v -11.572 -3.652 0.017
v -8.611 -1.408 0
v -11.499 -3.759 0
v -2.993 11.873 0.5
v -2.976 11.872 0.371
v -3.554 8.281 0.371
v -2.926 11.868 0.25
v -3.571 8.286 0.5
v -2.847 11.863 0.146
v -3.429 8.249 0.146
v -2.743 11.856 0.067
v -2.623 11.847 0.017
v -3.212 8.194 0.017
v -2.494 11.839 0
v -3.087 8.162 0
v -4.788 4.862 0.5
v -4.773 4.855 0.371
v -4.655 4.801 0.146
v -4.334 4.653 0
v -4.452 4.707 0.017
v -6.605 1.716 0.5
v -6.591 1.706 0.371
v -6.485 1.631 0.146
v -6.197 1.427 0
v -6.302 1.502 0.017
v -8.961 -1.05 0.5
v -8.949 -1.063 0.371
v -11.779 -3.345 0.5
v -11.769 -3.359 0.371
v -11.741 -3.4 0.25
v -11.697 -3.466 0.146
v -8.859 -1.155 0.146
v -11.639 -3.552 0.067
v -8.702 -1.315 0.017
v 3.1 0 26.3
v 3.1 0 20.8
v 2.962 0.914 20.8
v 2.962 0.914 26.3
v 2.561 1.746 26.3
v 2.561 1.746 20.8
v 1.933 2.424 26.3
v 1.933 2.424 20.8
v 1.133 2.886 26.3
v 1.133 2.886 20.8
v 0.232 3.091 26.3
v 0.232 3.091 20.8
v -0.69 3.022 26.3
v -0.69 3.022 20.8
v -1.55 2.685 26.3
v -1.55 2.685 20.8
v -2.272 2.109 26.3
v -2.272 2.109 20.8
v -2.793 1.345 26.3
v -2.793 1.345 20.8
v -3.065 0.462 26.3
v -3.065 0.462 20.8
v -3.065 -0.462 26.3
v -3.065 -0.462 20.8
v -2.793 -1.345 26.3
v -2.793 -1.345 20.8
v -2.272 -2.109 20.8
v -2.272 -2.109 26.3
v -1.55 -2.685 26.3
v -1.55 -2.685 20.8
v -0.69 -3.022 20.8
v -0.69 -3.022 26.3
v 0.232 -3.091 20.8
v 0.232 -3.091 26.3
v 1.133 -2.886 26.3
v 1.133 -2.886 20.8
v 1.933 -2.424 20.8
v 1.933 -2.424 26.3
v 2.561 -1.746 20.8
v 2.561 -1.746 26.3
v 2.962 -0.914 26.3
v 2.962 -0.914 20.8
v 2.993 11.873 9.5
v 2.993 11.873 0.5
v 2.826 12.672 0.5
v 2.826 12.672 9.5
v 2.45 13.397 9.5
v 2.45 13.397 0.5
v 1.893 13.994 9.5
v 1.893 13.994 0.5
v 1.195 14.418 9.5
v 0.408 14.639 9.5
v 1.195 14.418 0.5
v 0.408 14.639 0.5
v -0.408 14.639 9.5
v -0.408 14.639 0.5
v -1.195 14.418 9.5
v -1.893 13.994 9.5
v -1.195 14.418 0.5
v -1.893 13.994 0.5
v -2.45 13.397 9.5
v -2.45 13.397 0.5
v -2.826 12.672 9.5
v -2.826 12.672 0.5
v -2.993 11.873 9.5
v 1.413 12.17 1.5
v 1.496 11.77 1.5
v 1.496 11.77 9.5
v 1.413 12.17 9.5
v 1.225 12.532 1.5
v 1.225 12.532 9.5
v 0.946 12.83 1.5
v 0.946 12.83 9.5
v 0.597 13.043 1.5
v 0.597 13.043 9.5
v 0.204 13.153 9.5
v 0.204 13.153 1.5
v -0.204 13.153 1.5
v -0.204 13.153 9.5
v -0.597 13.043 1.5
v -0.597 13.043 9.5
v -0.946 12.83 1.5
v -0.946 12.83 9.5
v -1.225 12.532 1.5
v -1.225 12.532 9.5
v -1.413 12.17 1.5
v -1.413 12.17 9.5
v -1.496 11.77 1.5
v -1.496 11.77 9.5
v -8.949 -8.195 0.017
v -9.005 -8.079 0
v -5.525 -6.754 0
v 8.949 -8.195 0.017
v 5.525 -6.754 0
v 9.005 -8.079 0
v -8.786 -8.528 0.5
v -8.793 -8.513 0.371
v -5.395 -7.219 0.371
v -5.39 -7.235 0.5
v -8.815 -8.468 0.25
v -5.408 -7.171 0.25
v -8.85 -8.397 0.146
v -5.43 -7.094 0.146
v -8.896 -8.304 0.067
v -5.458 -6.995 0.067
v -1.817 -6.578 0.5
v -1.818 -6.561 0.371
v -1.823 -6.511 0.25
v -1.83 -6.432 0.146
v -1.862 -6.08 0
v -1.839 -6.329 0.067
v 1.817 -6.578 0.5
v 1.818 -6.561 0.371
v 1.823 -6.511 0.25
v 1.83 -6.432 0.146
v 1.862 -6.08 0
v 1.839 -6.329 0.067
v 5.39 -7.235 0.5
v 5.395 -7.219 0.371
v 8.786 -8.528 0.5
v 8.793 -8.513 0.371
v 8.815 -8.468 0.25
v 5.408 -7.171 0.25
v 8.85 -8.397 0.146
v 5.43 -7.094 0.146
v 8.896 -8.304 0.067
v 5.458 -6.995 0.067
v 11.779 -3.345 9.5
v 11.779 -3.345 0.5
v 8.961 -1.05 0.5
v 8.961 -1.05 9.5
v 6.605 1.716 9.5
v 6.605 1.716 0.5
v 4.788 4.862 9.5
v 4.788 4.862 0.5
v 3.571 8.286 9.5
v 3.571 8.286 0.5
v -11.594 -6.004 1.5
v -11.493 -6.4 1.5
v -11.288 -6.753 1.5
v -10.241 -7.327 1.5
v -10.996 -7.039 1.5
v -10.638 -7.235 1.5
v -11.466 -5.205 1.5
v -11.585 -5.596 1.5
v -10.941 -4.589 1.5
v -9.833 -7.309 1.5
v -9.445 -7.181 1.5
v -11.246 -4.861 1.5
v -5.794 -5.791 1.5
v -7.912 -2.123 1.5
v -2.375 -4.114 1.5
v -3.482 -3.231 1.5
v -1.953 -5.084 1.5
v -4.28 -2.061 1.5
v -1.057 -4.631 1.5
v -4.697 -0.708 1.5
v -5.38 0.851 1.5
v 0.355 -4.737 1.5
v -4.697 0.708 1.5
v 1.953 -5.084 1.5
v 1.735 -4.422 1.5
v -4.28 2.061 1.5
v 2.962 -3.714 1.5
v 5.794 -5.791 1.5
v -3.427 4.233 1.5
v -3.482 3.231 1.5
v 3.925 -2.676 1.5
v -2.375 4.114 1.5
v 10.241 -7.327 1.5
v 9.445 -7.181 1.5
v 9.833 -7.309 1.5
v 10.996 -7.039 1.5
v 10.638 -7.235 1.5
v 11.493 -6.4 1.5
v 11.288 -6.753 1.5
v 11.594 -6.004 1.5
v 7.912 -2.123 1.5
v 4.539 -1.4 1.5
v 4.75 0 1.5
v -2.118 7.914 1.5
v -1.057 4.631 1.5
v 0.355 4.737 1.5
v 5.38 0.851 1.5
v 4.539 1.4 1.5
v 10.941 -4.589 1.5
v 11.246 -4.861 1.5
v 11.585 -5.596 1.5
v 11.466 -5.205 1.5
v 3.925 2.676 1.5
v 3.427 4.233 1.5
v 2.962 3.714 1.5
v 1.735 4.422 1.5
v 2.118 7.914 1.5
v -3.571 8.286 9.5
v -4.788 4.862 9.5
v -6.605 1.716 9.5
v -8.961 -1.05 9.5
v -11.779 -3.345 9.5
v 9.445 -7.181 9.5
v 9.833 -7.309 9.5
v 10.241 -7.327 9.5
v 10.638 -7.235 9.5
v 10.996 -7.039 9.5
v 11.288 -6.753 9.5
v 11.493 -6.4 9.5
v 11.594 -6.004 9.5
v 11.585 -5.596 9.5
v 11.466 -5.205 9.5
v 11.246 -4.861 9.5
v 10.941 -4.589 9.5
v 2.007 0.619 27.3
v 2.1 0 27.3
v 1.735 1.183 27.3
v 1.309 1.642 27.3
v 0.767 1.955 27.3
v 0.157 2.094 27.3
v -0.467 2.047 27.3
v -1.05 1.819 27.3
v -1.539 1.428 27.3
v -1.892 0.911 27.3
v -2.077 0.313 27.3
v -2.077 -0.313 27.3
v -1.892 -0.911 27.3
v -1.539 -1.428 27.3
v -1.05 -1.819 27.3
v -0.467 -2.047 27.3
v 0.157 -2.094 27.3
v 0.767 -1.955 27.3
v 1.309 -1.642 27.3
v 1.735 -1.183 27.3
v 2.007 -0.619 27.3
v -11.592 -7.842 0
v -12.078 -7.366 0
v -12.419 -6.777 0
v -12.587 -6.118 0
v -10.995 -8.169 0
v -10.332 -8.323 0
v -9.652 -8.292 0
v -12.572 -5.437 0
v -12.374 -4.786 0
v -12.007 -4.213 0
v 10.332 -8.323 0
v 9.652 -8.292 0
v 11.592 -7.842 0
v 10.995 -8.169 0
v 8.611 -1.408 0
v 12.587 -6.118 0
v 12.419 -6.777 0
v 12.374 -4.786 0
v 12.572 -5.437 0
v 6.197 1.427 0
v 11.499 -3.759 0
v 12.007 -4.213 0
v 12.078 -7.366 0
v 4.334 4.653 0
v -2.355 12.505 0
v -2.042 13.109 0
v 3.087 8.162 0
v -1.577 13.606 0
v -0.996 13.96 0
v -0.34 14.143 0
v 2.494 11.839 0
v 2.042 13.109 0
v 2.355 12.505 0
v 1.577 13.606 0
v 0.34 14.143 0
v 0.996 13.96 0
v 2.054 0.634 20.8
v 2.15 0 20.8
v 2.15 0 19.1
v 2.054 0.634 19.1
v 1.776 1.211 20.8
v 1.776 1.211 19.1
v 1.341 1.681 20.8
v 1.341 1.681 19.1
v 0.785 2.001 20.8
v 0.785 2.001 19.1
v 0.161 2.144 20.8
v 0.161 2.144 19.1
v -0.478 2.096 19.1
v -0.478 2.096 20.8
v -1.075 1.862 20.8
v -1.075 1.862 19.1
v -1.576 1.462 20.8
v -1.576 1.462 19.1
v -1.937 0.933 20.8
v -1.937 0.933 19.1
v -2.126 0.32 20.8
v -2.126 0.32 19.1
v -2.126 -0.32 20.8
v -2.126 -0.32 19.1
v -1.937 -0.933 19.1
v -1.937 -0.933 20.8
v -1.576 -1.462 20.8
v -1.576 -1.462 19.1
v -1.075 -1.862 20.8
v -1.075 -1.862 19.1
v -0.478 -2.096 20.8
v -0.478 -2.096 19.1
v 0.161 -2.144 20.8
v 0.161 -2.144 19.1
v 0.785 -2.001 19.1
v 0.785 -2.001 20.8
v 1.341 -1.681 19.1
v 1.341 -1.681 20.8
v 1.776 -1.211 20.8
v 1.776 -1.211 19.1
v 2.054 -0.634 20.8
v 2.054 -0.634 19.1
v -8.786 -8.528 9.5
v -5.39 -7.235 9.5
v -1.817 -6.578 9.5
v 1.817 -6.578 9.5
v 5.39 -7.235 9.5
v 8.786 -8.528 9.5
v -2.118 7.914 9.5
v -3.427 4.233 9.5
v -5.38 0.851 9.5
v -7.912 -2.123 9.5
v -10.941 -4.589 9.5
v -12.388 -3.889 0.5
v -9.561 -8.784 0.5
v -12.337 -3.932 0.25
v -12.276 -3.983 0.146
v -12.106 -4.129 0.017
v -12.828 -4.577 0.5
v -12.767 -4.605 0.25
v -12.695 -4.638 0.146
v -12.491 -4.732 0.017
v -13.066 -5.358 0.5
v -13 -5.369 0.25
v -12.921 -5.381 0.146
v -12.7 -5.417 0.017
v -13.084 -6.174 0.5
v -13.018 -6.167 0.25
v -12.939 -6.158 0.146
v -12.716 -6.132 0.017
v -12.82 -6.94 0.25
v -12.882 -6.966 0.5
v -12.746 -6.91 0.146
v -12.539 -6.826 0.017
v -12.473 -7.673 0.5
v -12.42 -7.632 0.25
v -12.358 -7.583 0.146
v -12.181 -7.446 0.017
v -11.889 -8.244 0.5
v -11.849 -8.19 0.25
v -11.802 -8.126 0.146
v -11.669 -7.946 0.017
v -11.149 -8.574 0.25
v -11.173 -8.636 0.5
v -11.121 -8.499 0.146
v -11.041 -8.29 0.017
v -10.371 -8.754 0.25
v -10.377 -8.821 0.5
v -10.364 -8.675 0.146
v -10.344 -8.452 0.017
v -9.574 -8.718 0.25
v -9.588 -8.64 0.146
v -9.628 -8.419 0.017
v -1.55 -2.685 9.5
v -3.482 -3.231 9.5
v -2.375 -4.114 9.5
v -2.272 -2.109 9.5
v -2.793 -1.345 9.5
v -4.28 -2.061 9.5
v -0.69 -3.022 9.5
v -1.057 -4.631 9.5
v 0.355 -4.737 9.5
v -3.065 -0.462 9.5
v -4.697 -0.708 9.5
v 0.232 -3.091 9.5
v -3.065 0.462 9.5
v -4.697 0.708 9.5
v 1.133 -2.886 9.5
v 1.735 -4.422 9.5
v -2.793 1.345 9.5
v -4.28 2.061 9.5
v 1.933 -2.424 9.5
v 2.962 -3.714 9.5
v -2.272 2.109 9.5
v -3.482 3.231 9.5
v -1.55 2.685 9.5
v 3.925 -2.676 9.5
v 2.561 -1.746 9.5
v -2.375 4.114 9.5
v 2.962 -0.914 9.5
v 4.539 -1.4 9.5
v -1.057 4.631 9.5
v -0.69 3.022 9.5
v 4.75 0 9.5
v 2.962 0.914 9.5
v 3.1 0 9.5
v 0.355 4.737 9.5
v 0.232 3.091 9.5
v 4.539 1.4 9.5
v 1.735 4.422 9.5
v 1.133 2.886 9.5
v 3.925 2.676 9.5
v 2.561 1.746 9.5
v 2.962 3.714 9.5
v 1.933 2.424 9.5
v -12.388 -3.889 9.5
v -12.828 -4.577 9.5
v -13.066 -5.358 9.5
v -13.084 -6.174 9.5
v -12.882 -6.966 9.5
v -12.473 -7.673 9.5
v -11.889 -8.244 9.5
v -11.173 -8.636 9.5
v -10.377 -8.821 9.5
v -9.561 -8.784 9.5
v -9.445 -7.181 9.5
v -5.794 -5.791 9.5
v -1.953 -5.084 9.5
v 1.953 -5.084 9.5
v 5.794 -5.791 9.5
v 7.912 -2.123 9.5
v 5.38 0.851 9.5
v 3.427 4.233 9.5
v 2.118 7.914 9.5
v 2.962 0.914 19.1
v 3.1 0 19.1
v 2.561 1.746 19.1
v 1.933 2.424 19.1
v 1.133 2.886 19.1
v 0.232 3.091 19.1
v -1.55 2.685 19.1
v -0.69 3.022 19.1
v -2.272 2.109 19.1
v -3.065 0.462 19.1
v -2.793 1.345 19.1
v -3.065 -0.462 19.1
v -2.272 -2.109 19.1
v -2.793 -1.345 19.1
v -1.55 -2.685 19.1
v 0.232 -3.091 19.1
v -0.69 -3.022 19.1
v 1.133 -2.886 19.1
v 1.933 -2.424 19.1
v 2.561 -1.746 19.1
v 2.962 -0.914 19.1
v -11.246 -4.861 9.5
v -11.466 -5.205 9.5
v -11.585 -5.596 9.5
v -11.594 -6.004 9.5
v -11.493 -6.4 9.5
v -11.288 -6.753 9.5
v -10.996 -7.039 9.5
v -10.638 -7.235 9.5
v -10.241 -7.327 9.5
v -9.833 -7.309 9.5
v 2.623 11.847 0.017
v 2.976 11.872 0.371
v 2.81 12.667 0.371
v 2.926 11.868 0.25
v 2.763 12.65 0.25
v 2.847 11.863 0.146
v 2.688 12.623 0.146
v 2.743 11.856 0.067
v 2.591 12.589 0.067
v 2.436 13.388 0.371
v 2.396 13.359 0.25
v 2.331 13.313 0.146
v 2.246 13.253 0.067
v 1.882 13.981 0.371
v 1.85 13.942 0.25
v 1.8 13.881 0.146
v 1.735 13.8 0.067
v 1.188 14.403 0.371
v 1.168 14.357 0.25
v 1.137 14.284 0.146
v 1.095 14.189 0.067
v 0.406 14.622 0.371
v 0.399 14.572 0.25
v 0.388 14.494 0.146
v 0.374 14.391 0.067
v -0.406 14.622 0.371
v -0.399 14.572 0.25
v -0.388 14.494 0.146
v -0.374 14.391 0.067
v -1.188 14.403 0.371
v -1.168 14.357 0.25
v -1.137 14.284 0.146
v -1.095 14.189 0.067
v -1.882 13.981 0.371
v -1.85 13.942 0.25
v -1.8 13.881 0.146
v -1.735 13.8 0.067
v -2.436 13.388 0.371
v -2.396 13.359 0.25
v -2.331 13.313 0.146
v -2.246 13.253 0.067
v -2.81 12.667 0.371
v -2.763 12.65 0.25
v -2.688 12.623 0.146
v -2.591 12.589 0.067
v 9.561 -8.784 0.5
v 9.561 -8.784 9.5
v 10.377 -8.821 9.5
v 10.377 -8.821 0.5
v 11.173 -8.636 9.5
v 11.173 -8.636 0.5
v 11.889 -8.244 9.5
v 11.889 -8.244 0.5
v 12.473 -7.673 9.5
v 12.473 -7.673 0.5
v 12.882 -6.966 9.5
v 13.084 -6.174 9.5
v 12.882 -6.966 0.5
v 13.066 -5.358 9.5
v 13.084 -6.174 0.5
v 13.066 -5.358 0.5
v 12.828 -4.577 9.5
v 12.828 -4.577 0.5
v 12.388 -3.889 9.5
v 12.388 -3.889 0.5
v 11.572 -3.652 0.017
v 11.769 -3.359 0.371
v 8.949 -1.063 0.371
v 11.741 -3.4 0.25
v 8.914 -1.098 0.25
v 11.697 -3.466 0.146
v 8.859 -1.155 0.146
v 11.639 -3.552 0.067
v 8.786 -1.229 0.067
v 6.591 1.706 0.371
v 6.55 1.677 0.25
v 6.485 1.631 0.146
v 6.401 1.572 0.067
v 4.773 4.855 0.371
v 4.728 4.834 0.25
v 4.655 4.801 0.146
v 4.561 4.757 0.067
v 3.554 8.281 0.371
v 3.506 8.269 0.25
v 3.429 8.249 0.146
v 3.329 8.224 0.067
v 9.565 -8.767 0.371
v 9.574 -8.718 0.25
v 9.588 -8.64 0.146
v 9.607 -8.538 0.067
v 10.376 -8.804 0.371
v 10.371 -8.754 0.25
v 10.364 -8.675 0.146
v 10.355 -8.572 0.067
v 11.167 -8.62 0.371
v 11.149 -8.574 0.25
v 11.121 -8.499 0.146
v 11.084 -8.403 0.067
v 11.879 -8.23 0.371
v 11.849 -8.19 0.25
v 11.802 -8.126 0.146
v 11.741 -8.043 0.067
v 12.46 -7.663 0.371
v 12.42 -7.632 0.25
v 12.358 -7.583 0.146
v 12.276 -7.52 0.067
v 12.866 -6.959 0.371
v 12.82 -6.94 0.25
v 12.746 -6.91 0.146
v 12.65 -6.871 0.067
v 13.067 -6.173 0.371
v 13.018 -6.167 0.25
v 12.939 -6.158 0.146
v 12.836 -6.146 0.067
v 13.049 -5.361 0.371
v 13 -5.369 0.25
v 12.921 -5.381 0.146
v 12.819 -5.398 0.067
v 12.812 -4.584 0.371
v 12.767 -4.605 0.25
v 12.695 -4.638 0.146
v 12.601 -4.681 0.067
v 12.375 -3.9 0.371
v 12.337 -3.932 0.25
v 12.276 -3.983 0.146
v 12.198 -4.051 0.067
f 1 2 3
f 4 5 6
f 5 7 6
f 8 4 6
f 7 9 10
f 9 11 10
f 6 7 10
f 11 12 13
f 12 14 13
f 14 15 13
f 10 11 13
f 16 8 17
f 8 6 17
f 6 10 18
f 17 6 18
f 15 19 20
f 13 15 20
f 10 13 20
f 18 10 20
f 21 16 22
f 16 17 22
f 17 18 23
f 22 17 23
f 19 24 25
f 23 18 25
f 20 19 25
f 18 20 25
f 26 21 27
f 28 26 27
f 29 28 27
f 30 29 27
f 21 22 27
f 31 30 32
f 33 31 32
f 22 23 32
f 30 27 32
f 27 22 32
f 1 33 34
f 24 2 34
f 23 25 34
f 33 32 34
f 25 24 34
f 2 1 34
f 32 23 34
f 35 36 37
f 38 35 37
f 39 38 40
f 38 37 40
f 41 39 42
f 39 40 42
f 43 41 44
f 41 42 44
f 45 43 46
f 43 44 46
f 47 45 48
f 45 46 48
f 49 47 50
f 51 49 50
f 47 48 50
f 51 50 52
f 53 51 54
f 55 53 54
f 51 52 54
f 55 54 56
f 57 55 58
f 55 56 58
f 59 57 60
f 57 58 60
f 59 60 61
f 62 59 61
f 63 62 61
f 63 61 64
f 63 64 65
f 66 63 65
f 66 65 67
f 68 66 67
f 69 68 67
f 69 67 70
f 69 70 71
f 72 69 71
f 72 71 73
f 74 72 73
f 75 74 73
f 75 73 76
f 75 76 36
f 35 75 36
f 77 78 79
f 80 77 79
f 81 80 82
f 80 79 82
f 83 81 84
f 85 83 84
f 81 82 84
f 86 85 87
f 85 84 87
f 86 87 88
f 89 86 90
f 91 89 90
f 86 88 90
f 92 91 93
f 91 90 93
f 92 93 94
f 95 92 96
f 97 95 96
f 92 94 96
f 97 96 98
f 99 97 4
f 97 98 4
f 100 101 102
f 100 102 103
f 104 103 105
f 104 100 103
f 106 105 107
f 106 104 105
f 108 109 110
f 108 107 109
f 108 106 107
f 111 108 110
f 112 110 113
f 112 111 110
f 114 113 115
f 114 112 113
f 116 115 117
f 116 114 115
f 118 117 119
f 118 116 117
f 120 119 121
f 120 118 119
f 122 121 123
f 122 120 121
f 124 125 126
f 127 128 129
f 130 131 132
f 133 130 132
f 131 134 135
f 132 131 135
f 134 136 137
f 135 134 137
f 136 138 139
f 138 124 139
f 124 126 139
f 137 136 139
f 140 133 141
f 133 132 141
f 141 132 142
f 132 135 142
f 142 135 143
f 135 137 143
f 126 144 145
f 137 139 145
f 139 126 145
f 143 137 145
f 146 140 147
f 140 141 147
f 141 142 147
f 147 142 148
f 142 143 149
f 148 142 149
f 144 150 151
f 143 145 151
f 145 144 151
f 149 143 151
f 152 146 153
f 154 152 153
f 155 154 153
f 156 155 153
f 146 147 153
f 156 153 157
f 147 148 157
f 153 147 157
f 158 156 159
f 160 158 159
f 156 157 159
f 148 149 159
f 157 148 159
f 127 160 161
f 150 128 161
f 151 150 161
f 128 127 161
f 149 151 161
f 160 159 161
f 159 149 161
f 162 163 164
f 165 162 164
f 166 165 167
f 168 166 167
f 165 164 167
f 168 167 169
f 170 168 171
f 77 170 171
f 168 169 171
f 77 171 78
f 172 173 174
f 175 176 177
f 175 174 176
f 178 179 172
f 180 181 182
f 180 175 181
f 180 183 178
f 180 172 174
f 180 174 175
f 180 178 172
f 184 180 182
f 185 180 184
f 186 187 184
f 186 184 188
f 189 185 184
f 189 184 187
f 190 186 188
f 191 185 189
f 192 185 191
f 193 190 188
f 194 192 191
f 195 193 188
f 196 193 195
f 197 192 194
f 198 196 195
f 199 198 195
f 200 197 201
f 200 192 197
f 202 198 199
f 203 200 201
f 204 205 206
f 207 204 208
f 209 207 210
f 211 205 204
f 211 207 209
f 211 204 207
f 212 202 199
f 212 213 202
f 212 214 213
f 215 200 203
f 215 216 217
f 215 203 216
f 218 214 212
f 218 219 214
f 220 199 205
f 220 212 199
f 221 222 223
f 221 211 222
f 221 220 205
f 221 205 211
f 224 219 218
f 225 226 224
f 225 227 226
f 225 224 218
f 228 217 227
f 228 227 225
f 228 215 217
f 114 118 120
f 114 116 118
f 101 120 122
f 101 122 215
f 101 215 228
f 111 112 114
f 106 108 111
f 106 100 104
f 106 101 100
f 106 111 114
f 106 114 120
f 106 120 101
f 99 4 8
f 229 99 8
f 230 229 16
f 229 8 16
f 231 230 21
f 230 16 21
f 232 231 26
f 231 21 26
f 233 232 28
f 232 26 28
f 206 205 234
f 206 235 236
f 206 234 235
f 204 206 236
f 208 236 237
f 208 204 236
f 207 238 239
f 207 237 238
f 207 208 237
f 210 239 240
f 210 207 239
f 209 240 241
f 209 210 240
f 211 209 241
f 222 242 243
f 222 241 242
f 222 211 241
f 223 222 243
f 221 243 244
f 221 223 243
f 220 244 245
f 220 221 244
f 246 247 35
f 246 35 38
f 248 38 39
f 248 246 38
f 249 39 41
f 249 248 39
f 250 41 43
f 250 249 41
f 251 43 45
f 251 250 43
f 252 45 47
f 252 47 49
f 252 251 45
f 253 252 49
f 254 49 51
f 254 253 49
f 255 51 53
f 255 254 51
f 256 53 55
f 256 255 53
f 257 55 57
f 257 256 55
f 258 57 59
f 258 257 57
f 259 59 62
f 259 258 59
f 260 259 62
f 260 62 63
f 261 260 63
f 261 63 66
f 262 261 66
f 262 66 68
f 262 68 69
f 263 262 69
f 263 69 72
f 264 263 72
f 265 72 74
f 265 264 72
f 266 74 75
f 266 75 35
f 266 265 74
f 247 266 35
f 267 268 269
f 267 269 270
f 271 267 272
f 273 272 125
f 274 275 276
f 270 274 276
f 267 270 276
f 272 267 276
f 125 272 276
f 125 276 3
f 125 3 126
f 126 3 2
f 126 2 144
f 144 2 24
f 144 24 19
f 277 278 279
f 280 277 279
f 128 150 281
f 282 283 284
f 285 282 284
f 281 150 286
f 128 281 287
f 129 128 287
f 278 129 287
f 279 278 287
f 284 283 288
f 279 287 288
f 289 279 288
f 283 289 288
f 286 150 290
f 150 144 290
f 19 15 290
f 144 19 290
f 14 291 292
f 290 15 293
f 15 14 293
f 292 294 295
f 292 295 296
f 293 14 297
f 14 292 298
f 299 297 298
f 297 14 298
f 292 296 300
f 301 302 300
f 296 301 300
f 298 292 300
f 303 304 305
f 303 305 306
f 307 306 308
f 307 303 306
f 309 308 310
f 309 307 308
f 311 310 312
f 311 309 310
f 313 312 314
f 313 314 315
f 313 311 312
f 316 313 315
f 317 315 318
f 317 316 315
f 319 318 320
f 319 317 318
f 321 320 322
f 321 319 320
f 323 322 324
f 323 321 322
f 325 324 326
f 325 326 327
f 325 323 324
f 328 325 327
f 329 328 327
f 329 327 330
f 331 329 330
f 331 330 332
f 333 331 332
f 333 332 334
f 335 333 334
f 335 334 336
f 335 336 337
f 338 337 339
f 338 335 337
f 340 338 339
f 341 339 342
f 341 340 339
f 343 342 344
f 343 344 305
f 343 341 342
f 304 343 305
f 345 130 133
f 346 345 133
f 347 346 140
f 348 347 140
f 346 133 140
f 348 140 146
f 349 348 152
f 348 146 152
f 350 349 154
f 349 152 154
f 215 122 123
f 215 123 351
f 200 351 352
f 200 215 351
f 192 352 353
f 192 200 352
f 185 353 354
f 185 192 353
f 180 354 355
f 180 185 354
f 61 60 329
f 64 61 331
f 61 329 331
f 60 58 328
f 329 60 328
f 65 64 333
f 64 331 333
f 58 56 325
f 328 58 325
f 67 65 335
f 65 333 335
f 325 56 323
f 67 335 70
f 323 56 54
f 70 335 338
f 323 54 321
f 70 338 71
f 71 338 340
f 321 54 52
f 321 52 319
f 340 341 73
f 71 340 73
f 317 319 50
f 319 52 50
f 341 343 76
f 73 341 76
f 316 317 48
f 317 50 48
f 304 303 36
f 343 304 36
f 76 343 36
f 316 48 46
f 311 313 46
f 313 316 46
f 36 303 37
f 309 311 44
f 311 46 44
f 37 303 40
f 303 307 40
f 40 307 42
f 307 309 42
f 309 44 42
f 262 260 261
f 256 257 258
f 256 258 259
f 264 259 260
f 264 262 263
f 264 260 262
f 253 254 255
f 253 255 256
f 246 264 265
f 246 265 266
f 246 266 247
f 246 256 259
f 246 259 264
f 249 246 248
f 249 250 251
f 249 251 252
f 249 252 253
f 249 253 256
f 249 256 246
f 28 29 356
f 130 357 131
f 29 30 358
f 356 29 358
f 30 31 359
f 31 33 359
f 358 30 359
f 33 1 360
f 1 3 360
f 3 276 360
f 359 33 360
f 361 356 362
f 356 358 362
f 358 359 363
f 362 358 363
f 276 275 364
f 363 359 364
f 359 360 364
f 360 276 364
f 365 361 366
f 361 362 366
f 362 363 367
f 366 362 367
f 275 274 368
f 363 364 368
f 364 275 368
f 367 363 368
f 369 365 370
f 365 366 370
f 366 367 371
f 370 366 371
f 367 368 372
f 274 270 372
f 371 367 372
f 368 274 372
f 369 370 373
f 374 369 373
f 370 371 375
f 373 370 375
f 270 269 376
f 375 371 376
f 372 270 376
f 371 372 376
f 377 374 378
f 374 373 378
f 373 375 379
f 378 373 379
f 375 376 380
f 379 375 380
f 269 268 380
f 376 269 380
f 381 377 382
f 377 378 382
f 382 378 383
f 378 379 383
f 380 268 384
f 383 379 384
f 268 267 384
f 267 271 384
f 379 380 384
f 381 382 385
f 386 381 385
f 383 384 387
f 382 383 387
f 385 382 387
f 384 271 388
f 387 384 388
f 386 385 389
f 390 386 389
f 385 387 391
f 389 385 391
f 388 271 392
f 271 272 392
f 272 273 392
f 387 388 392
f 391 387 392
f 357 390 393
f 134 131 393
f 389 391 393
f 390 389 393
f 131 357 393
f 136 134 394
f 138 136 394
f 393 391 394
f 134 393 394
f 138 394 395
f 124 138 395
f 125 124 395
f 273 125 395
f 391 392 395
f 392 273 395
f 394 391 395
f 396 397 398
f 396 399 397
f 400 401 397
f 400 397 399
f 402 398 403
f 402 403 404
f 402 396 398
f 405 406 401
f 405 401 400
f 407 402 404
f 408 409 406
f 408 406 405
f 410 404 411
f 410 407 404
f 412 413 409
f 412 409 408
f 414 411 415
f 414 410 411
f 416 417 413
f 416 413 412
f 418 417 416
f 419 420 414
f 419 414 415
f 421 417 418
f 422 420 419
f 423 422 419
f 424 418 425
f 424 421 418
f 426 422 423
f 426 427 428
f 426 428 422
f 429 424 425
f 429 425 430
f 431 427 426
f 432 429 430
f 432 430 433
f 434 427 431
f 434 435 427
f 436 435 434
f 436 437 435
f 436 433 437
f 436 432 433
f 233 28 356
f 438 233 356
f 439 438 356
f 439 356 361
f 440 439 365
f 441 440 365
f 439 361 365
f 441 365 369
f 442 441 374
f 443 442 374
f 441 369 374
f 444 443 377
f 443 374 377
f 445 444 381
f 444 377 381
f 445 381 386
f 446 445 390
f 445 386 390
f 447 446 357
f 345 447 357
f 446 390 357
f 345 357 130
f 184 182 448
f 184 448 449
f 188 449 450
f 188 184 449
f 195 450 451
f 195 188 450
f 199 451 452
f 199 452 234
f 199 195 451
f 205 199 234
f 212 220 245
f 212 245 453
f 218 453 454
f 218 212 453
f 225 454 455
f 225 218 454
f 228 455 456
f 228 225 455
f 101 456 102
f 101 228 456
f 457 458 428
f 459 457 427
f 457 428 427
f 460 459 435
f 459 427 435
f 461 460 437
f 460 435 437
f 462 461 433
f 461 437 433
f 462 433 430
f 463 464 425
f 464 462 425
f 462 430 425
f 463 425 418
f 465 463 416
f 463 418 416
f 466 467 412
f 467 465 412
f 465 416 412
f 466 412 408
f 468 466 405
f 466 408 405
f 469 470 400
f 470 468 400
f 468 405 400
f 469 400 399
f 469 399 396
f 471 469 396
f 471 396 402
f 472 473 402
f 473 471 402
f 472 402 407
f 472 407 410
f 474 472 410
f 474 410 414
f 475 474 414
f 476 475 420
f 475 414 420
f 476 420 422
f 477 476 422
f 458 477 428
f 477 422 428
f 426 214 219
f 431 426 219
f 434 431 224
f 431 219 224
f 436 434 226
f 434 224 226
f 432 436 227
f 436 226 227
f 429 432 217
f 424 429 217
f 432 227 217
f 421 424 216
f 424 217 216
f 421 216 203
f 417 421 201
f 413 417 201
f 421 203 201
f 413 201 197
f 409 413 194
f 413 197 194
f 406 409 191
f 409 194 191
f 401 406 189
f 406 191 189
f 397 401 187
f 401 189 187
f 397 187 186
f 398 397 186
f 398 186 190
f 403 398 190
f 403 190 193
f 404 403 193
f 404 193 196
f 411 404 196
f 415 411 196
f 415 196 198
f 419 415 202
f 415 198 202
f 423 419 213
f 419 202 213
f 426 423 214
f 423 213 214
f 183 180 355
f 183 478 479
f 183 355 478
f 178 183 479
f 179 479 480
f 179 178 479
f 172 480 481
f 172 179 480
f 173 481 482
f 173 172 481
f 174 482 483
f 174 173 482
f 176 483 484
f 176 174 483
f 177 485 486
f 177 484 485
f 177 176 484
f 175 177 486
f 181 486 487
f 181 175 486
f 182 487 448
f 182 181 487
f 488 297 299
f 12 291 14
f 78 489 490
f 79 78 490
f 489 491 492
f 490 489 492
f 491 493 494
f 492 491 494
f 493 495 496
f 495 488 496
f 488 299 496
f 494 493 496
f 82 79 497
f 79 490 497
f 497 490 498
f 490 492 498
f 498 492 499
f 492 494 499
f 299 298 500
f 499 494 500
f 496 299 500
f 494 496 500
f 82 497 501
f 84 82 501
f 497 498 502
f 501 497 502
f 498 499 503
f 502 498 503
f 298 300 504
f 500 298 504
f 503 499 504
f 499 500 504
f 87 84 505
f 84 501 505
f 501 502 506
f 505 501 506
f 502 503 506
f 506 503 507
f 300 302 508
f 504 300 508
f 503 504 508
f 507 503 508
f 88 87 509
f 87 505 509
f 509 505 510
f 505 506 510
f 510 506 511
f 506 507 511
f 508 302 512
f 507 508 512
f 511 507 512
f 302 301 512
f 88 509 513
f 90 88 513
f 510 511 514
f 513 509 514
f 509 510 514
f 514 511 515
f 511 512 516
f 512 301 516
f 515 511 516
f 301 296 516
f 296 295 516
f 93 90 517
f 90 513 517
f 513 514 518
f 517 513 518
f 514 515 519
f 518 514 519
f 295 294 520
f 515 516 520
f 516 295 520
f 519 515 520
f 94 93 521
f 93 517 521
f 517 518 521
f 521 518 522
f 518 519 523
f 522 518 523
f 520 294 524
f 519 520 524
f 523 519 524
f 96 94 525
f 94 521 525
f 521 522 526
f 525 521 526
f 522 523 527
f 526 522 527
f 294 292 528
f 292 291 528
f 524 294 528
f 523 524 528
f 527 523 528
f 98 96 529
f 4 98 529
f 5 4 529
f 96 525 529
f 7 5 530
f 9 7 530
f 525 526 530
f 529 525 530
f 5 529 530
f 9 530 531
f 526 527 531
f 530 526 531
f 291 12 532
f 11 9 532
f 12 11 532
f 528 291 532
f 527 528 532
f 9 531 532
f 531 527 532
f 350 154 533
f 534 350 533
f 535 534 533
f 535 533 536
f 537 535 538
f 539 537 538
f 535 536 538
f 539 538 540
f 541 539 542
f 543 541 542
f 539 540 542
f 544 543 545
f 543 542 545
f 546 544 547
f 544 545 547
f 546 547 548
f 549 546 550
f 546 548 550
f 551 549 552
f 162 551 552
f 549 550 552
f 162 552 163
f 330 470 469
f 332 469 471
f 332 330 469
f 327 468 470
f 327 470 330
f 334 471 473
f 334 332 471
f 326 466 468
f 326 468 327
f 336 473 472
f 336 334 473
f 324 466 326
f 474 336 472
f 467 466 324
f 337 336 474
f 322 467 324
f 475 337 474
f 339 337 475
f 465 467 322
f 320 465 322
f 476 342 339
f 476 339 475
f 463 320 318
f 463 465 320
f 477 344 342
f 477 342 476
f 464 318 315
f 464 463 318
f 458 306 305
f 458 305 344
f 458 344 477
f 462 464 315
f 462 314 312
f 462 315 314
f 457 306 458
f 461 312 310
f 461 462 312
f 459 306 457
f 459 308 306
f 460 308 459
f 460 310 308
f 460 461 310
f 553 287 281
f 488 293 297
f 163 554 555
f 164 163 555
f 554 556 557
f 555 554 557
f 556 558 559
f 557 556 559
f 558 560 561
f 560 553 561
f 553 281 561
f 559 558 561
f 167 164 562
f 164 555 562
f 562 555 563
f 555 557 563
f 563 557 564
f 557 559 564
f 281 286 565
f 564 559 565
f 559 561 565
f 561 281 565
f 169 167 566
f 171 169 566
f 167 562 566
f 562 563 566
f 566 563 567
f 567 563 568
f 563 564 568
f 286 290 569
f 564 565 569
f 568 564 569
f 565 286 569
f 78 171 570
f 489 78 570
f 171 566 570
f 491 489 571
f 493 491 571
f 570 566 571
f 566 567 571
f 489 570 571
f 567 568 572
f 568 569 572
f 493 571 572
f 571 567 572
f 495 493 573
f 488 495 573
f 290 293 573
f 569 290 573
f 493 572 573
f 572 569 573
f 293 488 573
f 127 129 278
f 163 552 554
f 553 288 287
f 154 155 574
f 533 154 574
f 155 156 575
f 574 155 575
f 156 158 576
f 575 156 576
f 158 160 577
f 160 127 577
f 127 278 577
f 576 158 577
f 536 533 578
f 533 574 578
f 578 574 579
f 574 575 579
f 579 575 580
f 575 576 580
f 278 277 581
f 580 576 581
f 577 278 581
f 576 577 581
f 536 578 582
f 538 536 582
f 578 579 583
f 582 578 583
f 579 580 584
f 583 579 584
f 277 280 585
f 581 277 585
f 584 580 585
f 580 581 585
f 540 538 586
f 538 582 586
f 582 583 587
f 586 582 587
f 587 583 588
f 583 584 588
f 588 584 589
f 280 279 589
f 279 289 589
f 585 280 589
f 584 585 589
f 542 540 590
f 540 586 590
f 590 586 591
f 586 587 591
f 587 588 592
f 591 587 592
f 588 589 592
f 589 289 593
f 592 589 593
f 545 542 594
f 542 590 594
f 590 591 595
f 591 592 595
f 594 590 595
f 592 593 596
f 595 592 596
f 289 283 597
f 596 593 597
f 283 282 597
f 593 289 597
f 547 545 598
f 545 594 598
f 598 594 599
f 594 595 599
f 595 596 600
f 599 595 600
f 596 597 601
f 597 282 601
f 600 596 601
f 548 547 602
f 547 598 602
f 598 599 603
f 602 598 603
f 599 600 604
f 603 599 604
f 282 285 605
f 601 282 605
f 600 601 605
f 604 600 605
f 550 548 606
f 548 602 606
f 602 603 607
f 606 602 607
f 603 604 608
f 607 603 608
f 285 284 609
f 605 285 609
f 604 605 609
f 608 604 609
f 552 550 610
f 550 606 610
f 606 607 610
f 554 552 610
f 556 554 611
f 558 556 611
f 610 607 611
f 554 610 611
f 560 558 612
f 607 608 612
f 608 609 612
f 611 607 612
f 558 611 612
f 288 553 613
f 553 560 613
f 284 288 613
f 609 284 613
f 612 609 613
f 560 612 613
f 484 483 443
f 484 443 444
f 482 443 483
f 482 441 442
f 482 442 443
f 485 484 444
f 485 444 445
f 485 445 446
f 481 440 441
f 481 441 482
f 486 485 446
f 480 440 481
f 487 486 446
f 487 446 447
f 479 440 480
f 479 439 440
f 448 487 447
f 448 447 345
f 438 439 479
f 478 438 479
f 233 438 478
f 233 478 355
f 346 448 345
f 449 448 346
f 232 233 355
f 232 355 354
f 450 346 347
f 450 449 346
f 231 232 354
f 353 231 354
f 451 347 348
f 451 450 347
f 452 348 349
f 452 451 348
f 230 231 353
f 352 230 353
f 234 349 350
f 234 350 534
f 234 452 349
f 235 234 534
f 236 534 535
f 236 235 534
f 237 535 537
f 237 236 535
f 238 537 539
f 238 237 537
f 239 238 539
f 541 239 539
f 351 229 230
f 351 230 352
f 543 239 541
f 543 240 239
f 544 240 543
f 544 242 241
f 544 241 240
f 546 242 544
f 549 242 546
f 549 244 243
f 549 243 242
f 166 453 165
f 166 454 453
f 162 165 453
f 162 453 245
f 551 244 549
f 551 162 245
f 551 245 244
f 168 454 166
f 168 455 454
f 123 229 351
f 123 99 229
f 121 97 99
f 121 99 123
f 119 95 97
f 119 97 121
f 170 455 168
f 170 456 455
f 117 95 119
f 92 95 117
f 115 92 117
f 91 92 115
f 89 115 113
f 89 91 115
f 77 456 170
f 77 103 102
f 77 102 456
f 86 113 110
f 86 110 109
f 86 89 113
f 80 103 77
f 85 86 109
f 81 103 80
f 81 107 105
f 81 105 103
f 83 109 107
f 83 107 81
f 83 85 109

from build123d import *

# Parameters (mm, degrees)
BOSS_EXTRUDE1_DEPTH = 9.5
SHELL1_T            = -1.5
FILLET2_R           = 0.5
SKETCH2_R           = 4.75
BOSS_EXTRUDE2_DEPTH = 8
SKETCH4_R           = 3.1
BOSS_EXTRUDE3_DEPTH = 17.8
SKETCH5_R           = 5
SKETCH5_R_2         = 2.15
CUT_EXTRUDE1_DEPTH  = 1.7
CHAMFER1_SIZE       = 1


with BuildPart() as part:
    # Sketch1 → Boss-Extrude1 (new body)
    with BuildSketch(Plane.XY):
        with BuildLine():
            ThreePointArc((2.992904177, 11.872881569), (0, 14.666666667), (-2.992904177, 11.872881569))
            ThreePointArc((-2.992904177, 11.872881569), (-5.625090617, 3.247647582), (-11.778669143, -3.344509736))
            ThreePointArc((-11.778669143, -3.344509736), (-12.701705922, -7.333333333), (-8.785764966, -8.528371833))
            ThreePointArc((-8.785764966, -8.528371833), (0, -6.495295163), (8.785764966, -8.528371833))
            ThreePointArc((8.785764966, -8.528371833), (12.701705922, -7.333333333), (11.778669143, -3.344509736))
            ThreePointArc((11.778669143, -3.344509736), (5.625090617, 3.247647582), (2.992904177, 11.872881569))
        make_face()
    extrude(amount=BOSS_EXTRUDE1_DEPTH)

    # Shell1
    shell1_openings = [part.faces().sort_by_distance(p)[0] for p in [
        (0, 0, 9.5),
    ]]
    offset(amount=SHELL1_T, openings=shell1_openings, kind=Kind.INTERSECTION)

    # Fillet2
    fillet2_edges = [part.edges().sort_by_distance(p)[0] for p in [
        (-12.701705922, -7.333333333, 0),
        (-5.625090617, 3.247647582, 0),
        (0, 14.666666667, 0),
        (5.625090617, 3.247647582, 0),
        (12.701705922, -7.333333333, 0),
        (0, -6.495295163, 0),
    ]]
    fillet(fillet2_edges, radius=FILLET2_R)

    # Sketch2 → Boss-Extrude2 (add)
    with BuildSketch(Plane.XY.offset(1.5)):
        Circle(SKETCH2_R)
    extrude(amount=BOSS_EXTRUDE2_DEPTH)

    # Sketch4 → Boss-Extrude3 (add)
    with BuildSketch(Plane.XY.offset(9.5)):
        Circle(SKETCH4_R)
    extrude(amount=BOSS_EXTRUDE3_DEPTH)

    # Sketch5 → Cut-Extrude1 (cut)
    with BuildSketch(Plane.XY.offset(20.8)):
        Circle(SKETCH5_R)
        Circle(SKETCH5_R_2, mode=Mode.SUBTRACT)
    extrude(amount=-CUT_EXTRUDE1_DEPTH, mode=Mode.SUBTRACT)

    # Chamfer1
    chamfer1_edges = [part.edges().sort_by_distance(p)[0] for p in [
        (-3.1, 0, 27.3),
    ]]
    chamfer(chamfer1_edges, length=CHAMFER1_SIZE)


solid = part.part
